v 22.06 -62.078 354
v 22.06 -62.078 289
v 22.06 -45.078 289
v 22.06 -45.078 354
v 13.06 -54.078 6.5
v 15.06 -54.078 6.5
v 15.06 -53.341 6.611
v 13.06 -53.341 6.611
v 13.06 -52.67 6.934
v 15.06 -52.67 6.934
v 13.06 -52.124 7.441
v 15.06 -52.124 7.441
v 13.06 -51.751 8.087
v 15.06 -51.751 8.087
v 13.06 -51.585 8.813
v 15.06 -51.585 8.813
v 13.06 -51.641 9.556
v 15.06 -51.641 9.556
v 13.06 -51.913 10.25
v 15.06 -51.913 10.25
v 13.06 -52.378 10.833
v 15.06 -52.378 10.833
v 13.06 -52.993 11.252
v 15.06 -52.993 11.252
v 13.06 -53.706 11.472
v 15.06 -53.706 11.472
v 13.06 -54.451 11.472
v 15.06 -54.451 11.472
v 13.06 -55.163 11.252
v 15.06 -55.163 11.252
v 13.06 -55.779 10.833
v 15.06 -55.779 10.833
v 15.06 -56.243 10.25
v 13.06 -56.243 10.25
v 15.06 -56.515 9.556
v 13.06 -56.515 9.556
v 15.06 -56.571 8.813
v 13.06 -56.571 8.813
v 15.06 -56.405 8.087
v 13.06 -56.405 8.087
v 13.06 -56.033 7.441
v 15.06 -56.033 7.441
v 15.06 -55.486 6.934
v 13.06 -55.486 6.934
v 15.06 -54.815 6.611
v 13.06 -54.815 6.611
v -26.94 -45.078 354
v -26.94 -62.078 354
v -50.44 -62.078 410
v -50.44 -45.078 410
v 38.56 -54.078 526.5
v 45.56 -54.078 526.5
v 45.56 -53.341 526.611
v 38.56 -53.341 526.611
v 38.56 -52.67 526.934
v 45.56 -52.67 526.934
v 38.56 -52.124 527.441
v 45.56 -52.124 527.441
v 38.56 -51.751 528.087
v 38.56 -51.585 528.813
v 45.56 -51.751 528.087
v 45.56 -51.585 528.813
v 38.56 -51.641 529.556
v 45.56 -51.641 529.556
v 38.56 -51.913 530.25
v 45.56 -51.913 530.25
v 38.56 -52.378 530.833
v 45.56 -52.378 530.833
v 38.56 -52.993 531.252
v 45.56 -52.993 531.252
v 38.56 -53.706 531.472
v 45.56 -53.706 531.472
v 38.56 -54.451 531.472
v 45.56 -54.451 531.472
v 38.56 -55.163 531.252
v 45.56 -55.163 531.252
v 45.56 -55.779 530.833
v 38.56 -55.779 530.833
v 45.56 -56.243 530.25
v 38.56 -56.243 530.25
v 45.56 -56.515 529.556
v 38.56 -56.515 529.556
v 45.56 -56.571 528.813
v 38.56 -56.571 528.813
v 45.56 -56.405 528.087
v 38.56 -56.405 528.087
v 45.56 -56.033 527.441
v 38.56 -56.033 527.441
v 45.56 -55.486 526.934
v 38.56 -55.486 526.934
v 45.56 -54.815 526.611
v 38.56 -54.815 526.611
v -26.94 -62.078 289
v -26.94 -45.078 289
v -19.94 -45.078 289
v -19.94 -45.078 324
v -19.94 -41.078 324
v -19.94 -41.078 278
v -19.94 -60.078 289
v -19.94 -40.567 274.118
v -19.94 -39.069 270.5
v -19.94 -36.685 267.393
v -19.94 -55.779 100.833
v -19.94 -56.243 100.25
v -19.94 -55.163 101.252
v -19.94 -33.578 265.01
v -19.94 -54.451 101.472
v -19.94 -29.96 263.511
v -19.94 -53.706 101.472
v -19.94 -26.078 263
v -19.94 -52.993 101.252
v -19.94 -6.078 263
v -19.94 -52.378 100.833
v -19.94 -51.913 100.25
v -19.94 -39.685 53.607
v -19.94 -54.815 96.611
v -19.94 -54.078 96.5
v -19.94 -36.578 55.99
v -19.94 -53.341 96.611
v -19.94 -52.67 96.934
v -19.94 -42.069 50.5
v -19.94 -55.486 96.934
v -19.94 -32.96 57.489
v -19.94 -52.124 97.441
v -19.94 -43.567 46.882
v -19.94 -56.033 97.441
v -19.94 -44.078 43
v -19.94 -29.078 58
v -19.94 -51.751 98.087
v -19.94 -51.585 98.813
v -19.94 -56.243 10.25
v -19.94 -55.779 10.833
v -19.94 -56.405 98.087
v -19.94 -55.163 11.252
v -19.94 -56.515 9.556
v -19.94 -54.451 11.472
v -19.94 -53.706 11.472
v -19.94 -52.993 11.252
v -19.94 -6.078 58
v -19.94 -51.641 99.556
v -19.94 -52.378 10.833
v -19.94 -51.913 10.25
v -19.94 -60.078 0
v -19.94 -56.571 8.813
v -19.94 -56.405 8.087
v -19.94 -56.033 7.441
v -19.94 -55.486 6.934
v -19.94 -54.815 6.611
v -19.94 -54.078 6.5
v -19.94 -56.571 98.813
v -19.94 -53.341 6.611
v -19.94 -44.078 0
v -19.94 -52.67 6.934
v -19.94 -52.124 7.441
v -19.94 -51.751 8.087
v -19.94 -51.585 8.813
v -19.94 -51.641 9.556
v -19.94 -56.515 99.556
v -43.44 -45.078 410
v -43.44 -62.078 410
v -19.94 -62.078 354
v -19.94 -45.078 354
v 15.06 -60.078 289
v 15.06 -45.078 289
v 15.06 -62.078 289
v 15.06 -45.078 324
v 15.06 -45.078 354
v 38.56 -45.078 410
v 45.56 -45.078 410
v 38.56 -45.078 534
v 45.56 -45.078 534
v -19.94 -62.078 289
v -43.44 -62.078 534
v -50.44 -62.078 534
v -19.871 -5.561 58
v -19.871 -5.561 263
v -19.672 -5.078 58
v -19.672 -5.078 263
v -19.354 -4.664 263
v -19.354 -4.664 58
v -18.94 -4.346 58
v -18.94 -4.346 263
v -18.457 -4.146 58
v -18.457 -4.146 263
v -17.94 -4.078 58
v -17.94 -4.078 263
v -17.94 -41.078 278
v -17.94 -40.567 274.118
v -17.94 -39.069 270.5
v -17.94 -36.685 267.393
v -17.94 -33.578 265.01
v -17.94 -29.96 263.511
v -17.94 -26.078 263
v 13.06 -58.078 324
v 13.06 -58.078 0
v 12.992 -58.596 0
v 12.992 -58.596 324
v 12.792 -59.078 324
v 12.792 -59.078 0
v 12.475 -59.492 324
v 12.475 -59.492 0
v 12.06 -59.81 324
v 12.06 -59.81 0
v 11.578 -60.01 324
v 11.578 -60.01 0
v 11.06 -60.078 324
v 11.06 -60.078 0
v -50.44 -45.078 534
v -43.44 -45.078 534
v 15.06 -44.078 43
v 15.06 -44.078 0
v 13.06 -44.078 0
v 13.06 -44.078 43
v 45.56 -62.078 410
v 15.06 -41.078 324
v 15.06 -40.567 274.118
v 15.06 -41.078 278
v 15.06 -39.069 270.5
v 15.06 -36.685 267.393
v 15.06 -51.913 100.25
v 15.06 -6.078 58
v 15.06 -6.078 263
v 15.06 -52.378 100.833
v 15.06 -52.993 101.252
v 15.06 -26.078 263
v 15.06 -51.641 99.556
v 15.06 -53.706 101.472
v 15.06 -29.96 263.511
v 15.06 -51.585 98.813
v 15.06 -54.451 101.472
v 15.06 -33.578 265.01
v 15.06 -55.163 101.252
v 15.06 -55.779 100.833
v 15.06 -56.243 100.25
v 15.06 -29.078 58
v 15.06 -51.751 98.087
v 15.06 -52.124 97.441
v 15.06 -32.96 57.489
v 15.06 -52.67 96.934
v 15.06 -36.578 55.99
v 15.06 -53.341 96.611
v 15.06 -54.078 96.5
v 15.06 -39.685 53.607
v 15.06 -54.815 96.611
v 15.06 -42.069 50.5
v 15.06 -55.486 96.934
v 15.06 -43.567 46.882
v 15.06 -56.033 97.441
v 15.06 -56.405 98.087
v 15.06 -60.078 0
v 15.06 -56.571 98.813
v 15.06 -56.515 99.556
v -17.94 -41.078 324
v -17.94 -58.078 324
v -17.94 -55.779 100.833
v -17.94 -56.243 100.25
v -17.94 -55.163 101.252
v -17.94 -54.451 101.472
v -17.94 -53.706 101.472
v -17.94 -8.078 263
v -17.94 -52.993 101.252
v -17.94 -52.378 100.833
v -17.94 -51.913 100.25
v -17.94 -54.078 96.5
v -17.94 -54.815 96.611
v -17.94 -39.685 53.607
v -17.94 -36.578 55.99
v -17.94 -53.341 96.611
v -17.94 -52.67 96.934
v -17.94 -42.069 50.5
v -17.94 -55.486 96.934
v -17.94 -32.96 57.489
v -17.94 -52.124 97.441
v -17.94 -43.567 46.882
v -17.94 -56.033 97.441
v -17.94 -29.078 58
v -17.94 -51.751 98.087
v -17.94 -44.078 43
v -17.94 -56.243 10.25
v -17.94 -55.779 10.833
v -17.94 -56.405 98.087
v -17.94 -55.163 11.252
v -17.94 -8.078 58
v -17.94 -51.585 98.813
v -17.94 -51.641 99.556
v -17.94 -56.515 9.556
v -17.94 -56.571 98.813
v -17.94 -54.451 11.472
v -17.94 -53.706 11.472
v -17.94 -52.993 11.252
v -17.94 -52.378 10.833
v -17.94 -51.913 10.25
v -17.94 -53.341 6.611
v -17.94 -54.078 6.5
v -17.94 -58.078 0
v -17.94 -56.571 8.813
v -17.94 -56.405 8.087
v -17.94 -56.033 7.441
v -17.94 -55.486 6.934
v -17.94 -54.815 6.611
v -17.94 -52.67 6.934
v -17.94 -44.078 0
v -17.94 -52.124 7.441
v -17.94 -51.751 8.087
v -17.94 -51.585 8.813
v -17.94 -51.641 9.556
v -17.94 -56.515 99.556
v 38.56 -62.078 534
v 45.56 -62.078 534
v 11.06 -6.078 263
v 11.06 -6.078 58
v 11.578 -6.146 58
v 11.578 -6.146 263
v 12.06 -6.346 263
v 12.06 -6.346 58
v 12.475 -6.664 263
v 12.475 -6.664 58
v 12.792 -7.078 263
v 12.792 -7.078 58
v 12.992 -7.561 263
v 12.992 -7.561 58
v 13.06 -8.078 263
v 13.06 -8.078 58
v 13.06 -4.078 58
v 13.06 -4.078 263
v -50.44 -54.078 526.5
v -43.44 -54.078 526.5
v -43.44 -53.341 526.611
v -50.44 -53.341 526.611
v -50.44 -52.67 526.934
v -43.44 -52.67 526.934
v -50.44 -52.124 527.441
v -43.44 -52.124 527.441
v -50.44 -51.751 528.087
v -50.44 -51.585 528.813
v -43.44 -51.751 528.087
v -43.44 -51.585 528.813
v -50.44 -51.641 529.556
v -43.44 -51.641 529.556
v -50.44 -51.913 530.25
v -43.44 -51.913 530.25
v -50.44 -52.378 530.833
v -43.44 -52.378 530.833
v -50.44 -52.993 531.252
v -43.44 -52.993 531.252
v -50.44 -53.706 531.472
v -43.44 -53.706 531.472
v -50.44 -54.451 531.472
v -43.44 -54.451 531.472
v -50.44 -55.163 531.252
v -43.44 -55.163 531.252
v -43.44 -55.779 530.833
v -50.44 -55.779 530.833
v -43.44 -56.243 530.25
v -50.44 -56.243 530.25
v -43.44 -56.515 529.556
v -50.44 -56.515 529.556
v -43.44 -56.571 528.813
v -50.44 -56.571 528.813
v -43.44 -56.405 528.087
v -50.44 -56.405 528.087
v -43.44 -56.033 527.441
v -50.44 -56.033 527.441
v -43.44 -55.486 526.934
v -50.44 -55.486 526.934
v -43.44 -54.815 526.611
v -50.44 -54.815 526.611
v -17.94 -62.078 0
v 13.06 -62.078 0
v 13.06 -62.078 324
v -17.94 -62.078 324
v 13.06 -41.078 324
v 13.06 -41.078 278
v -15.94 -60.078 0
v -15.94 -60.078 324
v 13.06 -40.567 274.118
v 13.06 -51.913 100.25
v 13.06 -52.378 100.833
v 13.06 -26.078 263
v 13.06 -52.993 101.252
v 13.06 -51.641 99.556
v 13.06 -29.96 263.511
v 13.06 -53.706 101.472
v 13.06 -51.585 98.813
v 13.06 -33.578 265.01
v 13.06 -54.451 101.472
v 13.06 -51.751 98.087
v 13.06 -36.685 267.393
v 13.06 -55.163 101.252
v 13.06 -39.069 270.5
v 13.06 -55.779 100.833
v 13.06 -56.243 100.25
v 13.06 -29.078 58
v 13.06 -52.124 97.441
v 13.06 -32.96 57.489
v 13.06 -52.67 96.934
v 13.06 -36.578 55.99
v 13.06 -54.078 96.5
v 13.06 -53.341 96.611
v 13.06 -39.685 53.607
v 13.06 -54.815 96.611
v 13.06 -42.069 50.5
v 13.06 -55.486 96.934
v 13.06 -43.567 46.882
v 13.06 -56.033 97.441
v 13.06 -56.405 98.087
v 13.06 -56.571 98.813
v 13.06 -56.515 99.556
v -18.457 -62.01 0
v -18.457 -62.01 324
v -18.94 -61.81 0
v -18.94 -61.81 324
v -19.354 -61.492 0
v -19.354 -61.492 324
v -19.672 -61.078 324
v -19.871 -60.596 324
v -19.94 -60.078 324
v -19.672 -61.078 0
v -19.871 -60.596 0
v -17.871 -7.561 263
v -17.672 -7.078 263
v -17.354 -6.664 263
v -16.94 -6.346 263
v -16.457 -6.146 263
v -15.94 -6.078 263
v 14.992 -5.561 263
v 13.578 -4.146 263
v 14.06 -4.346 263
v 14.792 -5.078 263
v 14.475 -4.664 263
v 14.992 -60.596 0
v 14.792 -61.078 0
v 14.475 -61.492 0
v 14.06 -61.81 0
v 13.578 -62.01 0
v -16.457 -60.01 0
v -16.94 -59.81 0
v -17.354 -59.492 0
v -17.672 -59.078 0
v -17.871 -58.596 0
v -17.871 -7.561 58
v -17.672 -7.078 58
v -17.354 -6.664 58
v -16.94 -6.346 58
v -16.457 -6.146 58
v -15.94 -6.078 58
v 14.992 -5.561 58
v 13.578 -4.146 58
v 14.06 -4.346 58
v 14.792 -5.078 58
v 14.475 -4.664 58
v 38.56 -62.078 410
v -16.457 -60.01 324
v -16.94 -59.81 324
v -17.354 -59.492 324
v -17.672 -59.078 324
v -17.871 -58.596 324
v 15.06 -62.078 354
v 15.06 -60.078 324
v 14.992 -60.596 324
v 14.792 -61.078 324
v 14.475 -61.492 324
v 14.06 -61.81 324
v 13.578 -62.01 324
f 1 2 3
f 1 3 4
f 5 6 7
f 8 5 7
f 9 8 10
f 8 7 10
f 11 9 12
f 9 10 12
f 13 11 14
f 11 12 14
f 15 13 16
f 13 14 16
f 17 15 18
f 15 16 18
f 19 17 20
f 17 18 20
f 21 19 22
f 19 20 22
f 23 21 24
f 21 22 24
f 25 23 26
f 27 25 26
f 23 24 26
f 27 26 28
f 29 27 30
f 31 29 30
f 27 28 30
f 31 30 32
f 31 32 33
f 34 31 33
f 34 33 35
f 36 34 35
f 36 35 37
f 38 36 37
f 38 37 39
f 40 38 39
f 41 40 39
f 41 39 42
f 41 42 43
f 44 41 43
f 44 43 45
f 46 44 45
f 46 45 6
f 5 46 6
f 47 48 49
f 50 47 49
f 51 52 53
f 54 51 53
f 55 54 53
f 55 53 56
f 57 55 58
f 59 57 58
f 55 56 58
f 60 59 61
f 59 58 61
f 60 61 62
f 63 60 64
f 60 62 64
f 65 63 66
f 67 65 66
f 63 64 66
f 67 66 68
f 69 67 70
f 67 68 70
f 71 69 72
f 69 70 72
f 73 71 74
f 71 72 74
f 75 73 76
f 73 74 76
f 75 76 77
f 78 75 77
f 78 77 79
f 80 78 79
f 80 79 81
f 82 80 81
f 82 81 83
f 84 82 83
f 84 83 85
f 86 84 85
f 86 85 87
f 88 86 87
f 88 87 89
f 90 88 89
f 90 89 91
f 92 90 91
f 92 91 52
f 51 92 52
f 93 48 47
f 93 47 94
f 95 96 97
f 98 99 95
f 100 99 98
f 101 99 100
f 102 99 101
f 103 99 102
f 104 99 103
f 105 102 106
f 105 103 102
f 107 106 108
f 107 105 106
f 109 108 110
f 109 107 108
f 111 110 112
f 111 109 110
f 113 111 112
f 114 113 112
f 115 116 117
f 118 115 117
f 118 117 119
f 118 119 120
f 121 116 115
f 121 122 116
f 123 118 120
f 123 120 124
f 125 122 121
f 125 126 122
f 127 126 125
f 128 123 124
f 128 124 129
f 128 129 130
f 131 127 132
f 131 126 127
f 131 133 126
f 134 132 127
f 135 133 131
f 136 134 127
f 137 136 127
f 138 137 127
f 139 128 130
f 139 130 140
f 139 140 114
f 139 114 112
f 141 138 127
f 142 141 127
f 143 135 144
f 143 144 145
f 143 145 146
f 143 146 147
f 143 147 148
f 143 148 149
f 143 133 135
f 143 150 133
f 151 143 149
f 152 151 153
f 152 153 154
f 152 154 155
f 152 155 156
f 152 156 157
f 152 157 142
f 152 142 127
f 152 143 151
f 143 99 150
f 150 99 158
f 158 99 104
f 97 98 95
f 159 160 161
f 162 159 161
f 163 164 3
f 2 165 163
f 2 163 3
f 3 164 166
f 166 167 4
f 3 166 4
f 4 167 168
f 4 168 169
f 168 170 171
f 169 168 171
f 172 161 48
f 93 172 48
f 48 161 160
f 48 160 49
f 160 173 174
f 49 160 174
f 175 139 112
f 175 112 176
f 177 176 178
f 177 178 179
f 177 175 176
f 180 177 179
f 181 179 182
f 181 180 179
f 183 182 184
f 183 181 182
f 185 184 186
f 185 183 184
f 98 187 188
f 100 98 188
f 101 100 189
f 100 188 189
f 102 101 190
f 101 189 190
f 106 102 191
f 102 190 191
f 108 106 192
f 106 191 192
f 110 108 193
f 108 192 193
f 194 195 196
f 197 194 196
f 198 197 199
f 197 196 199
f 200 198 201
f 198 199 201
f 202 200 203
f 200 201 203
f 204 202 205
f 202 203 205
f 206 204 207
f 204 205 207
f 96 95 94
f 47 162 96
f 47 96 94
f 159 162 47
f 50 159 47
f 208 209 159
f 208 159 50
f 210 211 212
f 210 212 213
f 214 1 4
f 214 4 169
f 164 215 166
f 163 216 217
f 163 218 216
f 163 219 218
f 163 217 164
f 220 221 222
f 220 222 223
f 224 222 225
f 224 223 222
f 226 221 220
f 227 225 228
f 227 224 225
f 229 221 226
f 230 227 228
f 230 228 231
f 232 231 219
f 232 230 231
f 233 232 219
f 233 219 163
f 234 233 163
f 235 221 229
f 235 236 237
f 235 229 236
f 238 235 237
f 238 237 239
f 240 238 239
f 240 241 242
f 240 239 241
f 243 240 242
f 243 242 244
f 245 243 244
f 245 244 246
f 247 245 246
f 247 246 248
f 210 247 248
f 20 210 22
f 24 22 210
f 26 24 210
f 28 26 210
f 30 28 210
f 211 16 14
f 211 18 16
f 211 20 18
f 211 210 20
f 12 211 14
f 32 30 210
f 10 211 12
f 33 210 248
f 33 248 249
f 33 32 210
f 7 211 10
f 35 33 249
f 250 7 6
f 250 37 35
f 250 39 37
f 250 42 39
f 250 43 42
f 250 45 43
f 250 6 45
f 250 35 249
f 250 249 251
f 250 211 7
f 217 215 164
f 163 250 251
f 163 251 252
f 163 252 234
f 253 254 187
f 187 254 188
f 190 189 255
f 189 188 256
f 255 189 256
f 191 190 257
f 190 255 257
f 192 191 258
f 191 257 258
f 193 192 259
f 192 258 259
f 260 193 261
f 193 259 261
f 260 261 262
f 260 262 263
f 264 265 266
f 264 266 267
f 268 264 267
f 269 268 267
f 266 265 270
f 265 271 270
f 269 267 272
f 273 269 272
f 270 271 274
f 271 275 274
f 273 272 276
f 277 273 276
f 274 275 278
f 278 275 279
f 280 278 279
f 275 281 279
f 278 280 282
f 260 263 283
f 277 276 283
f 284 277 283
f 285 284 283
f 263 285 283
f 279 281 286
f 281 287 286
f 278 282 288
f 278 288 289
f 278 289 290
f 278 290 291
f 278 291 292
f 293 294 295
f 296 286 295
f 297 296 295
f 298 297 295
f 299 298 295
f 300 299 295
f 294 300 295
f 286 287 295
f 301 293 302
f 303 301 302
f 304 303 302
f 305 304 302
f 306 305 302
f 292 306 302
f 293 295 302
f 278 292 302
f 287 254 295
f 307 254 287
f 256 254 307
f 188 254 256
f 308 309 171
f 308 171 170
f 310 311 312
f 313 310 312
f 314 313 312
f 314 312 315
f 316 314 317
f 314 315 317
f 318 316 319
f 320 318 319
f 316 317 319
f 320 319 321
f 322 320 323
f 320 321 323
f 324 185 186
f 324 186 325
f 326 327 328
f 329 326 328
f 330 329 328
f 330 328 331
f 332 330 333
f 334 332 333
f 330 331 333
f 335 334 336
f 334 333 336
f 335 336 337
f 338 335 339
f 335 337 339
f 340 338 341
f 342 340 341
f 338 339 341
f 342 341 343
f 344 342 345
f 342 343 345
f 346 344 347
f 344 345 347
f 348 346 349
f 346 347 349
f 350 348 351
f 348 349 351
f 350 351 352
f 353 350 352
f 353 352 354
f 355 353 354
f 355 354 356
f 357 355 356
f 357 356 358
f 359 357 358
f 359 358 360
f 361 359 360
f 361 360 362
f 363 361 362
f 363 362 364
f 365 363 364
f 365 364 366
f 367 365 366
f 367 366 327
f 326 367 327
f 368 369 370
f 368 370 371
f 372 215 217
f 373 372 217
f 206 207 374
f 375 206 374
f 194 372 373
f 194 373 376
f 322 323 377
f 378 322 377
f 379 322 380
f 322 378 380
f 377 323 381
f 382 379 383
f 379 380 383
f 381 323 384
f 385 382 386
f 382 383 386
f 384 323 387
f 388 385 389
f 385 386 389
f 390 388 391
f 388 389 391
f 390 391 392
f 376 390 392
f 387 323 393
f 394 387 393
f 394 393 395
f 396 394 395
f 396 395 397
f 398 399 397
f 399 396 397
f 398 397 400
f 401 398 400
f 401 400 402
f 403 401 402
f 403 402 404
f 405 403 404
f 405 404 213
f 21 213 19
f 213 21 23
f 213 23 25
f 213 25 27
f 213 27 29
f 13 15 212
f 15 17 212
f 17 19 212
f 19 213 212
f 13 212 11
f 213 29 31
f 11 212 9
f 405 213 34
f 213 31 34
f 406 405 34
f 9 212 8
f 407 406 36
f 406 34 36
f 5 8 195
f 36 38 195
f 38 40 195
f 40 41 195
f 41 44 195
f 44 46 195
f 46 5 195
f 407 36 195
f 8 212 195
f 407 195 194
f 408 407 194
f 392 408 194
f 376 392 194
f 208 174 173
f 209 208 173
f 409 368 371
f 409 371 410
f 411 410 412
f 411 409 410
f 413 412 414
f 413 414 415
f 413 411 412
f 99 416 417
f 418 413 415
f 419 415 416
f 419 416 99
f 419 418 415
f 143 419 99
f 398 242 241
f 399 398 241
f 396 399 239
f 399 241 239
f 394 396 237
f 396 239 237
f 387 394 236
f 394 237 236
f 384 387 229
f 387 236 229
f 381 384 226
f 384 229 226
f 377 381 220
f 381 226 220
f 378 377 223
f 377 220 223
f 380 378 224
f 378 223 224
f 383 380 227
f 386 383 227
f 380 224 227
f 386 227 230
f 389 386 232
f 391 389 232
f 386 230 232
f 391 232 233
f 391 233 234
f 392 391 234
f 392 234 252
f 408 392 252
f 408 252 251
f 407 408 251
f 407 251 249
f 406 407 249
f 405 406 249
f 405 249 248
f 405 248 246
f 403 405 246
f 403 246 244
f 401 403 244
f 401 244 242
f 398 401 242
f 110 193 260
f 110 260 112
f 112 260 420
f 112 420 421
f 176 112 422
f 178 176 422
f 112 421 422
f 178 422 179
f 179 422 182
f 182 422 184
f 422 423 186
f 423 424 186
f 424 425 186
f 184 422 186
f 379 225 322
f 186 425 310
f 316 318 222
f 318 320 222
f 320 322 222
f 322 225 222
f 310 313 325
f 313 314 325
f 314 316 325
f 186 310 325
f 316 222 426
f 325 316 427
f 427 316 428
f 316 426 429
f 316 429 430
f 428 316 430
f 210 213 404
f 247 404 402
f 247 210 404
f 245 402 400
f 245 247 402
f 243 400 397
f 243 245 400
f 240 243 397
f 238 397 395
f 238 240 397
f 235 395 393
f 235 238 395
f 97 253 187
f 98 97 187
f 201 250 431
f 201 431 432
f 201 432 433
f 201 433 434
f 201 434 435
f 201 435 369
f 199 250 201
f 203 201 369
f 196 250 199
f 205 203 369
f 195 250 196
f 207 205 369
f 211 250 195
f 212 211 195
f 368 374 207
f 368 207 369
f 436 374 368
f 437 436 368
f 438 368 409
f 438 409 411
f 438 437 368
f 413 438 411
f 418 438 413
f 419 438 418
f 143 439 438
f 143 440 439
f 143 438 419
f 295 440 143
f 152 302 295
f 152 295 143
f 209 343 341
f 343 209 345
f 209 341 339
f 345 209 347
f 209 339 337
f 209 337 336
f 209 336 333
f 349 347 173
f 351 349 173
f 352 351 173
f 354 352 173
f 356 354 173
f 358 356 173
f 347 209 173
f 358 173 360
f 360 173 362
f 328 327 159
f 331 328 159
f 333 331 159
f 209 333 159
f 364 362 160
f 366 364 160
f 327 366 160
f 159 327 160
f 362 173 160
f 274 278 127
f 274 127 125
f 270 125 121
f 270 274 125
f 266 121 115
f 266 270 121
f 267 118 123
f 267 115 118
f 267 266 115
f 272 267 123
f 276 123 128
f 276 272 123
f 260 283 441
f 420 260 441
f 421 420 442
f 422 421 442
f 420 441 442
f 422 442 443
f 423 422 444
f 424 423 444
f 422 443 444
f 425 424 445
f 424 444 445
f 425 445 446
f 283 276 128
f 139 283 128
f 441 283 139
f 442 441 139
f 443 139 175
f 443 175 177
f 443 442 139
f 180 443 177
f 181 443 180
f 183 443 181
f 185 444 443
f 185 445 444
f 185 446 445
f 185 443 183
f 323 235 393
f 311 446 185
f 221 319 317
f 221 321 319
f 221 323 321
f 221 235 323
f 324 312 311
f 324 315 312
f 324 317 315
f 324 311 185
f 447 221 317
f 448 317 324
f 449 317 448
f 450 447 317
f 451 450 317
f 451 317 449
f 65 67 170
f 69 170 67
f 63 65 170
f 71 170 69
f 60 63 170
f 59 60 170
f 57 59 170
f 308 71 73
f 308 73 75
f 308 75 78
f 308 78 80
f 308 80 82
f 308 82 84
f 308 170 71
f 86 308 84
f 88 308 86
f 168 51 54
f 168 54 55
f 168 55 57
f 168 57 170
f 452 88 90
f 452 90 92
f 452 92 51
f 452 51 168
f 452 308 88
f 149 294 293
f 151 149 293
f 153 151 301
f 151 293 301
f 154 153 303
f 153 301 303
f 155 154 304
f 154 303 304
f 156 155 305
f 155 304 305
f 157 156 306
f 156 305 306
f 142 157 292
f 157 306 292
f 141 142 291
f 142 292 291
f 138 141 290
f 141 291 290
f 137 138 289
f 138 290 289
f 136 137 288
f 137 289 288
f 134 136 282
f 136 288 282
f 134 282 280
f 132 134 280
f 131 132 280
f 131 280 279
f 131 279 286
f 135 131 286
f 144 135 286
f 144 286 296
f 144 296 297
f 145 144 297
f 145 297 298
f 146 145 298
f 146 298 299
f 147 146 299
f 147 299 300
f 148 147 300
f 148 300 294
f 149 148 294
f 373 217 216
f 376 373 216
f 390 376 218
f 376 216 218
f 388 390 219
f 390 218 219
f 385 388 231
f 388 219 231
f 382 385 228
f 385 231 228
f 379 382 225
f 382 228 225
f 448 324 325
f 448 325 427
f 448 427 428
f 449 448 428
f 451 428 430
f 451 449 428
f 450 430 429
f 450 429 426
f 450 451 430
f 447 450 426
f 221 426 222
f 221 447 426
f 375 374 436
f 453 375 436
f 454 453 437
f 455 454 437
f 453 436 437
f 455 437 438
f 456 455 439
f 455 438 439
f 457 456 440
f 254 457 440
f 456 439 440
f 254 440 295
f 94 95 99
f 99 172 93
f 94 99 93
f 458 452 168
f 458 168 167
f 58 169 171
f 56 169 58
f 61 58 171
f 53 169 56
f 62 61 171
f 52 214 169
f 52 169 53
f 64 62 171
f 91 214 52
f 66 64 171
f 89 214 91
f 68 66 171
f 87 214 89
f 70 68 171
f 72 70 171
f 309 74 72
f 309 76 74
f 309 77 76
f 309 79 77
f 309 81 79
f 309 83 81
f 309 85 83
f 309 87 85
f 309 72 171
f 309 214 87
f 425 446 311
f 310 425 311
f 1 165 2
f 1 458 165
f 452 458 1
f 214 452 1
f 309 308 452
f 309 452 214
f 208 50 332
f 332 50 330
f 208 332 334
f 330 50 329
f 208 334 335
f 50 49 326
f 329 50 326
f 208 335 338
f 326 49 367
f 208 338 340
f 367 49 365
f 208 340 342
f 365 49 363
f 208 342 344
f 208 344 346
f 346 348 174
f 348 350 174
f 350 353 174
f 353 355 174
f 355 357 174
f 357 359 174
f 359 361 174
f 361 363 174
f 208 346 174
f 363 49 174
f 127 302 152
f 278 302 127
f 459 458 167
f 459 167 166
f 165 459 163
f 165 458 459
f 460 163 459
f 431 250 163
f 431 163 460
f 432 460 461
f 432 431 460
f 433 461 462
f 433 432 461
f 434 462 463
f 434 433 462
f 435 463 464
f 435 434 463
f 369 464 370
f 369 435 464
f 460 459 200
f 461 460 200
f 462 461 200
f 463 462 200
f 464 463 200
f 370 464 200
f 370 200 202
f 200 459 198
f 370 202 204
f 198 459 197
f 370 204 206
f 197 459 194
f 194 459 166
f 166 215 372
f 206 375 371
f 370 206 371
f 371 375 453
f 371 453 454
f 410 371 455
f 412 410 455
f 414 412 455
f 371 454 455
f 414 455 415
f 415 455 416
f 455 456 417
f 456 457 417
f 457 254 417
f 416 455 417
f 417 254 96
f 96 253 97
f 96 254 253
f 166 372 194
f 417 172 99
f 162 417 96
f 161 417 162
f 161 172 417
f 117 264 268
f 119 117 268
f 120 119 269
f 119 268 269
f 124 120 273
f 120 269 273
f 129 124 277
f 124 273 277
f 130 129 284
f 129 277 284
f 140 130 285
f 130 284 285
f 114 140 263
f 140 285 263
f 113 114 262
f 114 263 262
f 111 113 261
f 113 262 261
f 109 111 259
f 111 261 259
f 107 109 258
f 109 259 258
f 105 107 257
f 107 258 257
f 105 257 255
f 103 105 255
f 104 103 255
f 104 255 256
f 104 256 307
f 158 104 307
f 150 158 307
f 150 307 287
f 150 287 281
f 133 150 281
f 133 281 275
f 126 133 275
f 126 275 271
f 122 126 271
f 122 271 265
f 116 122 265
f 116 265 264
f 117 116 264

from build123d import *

# Parameters (mm, degrees)
EXTRUDE1_DEPTH = 324
SKETCH2_R      = 2.5
EXTRUDE2_DEPTH = 36
EXTRUDE3_DEPTH = 17
SKETCH4_R      = 2.5
EXTRUDE4_DEPTH = 97


with BuildPart() as part:
    # Sketch1 → Extrude1 (new body)
    with BuildSketch(Plane.XY):
        with BuildLine():
            Line((-17.939611789, -4.078161588), (13.060388211, -4.078161588))
            ThreePointArc((13.060388211, -4.078161588), (14.474601773, -4.663948025), (15.060388211, -6.078161588))
            Line((15.060388211, -6.078161588), (15.060388211, -60.078161588))
            ThreePointArc((15.060388211, -60.078161588), (14.474601773, -61.49237515), (13.060388211, -62.078161588))
            Line((13.060388211, -62.078161588), (-17.939611789, -62.078161588))
            ThreePointArc((-17.939611789, -62.078161588), (-19.353825352, -61.49237515), (-19.939611789, -60.078161588))
            Line((-19.939611789, -60.078161588), (-19.939611789, -6.078161588))
            ThreePointArc((-19.939611789, -6.078161588), (-19.353825352, -4.663948025), (-17.939611789, -4.078161588))
        make_face()
        with BuildLine():
            Line((-15.939611789, -6.078161588), (11.060388211, -6.078161588))
            ThreePointArc((11.060388211, -6.078161588), (12.474601773, -6.663948025), (13.060388211, -8.078161588))
            Line((13.060388211, -8.078161588), (13.060388211, -58.078161588))
            ThreePointArc((13.060388211, -58.078161588), (12.474601773, -59.49237515), (11.060388211, -60.078161588))
            Line((11.060388211, -60.078161588), (-15.939611789, -60.078161588))
            ThreePointArc((-15.939611789, -60.078161588), (-17.353825352, -59.49237515), (-17.939611789, -58.078161588))
            Line((-17.939611789, -58.078161588), (-17.939611789, -8.078161588))
            ThreePointArc((-17.939611789, -8.078161588), (-17.353825352, -6.663948025), (-15.939611789, -6.078161588))
        make_face(mode=Mode.SUBTRACT)
    extrude(amount=EXTRUDE1_DEPTH)

    # Sketch2 → Extrude2 (cut, through all)
    with BuildSketch(Plane(origin=(15.060388211, 0, 0), x_dir=(0, 0, -1), z_dir=(1, 0, 0))):
        with Locations((-9, -54.078161588)):
            Circle(SKETCH2_R)
        with Locations((-99, -54.078161588)):
            Circle(SKETCH2_R)
        with BuildLine():
            Line((0, -44.078161588), (-43, -44.078161588))
            ThreePointArc((-43, -44.078161588), (-53.606601718, -39.684763305), (-58, -29.078161588))
            Line((-58, -29.078161588), (-58, -4.078161588))
            Line((-58, -4.078161588), (0, -4.078161588))
            Line((0, -4.078161588), (0, -44.078161588))
        make_face()
        with BuildLine():
            Line((-324, -41.078161588), (-278, -41.078161588))
            ThreePointArc((-278, -41.078161588), (-267.393398282, -36.684763305), (-263, -26.078161588))
            Line((-263, -26.078161588), (-263, -4.078161588))
            Line((-263, -4.078161588), (-324, -4.078161588))
            Line((-324, -4.078161588), (-324, -41.078161588))
        make_face()
    extrude(amount=-EXTRUDE2_DEPTH, mode=Mode.SUBTRACT)

    # Sketch3 → Extrude3 (add)
    with BuildSketch(Plane.XZ.offset(62.078161588)):
        Polygon((15.060388211, 324), (15.060388211, 289), (22.060388211, 289), (22.060388211, 324), (22.060388211, 354), (45.560388211, 410), (45.560388211, 534), (38.560388211, 534), (38.560388211, 410), (15.060388211, 354), align=None)
        Polygon((-19.939611789, 324), (-19.939611789, 289), (-26.939611789, 289), (-26.939611789, 324), (-26.939611789, 354), (-50.439611789, 410), (-50.439611789, 534), (-43.439611789, 534), (-43.439611789, 410), (-19.939611789, 354), align=None)
    extrude(amount=-EXTRUDE3_DEPTH)

    # Sketch4 → Extrude4 (cut, through all)
    with BuildSketch(Plane(origin=(45.560388211, 0, 0), x_dir=(0, 0, -1), z_dir=(1, 0, 0))):
        with Locations((-529, -54.078161588)):
            Circle(SKETCH4_R)
    extrude(amount=-EXTRUDE4_DEPTH, mode=Mode.SUBTRACT)


solid = part.part
